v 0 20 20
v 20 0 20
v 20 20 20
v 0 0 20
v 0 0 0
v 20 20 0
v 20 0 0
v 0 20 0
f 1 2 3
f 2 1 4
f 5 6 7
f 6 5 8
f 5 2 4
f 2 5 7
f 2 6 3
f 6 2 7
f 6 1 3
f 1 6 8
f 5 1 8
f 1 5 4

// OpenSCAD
// Setup check: all dimensions are in millimetres.
size_mm = 20;
assert(size_mm > 0, "Cube size must be positive.");
cube([size_mm, size_mm, size_mm]);
